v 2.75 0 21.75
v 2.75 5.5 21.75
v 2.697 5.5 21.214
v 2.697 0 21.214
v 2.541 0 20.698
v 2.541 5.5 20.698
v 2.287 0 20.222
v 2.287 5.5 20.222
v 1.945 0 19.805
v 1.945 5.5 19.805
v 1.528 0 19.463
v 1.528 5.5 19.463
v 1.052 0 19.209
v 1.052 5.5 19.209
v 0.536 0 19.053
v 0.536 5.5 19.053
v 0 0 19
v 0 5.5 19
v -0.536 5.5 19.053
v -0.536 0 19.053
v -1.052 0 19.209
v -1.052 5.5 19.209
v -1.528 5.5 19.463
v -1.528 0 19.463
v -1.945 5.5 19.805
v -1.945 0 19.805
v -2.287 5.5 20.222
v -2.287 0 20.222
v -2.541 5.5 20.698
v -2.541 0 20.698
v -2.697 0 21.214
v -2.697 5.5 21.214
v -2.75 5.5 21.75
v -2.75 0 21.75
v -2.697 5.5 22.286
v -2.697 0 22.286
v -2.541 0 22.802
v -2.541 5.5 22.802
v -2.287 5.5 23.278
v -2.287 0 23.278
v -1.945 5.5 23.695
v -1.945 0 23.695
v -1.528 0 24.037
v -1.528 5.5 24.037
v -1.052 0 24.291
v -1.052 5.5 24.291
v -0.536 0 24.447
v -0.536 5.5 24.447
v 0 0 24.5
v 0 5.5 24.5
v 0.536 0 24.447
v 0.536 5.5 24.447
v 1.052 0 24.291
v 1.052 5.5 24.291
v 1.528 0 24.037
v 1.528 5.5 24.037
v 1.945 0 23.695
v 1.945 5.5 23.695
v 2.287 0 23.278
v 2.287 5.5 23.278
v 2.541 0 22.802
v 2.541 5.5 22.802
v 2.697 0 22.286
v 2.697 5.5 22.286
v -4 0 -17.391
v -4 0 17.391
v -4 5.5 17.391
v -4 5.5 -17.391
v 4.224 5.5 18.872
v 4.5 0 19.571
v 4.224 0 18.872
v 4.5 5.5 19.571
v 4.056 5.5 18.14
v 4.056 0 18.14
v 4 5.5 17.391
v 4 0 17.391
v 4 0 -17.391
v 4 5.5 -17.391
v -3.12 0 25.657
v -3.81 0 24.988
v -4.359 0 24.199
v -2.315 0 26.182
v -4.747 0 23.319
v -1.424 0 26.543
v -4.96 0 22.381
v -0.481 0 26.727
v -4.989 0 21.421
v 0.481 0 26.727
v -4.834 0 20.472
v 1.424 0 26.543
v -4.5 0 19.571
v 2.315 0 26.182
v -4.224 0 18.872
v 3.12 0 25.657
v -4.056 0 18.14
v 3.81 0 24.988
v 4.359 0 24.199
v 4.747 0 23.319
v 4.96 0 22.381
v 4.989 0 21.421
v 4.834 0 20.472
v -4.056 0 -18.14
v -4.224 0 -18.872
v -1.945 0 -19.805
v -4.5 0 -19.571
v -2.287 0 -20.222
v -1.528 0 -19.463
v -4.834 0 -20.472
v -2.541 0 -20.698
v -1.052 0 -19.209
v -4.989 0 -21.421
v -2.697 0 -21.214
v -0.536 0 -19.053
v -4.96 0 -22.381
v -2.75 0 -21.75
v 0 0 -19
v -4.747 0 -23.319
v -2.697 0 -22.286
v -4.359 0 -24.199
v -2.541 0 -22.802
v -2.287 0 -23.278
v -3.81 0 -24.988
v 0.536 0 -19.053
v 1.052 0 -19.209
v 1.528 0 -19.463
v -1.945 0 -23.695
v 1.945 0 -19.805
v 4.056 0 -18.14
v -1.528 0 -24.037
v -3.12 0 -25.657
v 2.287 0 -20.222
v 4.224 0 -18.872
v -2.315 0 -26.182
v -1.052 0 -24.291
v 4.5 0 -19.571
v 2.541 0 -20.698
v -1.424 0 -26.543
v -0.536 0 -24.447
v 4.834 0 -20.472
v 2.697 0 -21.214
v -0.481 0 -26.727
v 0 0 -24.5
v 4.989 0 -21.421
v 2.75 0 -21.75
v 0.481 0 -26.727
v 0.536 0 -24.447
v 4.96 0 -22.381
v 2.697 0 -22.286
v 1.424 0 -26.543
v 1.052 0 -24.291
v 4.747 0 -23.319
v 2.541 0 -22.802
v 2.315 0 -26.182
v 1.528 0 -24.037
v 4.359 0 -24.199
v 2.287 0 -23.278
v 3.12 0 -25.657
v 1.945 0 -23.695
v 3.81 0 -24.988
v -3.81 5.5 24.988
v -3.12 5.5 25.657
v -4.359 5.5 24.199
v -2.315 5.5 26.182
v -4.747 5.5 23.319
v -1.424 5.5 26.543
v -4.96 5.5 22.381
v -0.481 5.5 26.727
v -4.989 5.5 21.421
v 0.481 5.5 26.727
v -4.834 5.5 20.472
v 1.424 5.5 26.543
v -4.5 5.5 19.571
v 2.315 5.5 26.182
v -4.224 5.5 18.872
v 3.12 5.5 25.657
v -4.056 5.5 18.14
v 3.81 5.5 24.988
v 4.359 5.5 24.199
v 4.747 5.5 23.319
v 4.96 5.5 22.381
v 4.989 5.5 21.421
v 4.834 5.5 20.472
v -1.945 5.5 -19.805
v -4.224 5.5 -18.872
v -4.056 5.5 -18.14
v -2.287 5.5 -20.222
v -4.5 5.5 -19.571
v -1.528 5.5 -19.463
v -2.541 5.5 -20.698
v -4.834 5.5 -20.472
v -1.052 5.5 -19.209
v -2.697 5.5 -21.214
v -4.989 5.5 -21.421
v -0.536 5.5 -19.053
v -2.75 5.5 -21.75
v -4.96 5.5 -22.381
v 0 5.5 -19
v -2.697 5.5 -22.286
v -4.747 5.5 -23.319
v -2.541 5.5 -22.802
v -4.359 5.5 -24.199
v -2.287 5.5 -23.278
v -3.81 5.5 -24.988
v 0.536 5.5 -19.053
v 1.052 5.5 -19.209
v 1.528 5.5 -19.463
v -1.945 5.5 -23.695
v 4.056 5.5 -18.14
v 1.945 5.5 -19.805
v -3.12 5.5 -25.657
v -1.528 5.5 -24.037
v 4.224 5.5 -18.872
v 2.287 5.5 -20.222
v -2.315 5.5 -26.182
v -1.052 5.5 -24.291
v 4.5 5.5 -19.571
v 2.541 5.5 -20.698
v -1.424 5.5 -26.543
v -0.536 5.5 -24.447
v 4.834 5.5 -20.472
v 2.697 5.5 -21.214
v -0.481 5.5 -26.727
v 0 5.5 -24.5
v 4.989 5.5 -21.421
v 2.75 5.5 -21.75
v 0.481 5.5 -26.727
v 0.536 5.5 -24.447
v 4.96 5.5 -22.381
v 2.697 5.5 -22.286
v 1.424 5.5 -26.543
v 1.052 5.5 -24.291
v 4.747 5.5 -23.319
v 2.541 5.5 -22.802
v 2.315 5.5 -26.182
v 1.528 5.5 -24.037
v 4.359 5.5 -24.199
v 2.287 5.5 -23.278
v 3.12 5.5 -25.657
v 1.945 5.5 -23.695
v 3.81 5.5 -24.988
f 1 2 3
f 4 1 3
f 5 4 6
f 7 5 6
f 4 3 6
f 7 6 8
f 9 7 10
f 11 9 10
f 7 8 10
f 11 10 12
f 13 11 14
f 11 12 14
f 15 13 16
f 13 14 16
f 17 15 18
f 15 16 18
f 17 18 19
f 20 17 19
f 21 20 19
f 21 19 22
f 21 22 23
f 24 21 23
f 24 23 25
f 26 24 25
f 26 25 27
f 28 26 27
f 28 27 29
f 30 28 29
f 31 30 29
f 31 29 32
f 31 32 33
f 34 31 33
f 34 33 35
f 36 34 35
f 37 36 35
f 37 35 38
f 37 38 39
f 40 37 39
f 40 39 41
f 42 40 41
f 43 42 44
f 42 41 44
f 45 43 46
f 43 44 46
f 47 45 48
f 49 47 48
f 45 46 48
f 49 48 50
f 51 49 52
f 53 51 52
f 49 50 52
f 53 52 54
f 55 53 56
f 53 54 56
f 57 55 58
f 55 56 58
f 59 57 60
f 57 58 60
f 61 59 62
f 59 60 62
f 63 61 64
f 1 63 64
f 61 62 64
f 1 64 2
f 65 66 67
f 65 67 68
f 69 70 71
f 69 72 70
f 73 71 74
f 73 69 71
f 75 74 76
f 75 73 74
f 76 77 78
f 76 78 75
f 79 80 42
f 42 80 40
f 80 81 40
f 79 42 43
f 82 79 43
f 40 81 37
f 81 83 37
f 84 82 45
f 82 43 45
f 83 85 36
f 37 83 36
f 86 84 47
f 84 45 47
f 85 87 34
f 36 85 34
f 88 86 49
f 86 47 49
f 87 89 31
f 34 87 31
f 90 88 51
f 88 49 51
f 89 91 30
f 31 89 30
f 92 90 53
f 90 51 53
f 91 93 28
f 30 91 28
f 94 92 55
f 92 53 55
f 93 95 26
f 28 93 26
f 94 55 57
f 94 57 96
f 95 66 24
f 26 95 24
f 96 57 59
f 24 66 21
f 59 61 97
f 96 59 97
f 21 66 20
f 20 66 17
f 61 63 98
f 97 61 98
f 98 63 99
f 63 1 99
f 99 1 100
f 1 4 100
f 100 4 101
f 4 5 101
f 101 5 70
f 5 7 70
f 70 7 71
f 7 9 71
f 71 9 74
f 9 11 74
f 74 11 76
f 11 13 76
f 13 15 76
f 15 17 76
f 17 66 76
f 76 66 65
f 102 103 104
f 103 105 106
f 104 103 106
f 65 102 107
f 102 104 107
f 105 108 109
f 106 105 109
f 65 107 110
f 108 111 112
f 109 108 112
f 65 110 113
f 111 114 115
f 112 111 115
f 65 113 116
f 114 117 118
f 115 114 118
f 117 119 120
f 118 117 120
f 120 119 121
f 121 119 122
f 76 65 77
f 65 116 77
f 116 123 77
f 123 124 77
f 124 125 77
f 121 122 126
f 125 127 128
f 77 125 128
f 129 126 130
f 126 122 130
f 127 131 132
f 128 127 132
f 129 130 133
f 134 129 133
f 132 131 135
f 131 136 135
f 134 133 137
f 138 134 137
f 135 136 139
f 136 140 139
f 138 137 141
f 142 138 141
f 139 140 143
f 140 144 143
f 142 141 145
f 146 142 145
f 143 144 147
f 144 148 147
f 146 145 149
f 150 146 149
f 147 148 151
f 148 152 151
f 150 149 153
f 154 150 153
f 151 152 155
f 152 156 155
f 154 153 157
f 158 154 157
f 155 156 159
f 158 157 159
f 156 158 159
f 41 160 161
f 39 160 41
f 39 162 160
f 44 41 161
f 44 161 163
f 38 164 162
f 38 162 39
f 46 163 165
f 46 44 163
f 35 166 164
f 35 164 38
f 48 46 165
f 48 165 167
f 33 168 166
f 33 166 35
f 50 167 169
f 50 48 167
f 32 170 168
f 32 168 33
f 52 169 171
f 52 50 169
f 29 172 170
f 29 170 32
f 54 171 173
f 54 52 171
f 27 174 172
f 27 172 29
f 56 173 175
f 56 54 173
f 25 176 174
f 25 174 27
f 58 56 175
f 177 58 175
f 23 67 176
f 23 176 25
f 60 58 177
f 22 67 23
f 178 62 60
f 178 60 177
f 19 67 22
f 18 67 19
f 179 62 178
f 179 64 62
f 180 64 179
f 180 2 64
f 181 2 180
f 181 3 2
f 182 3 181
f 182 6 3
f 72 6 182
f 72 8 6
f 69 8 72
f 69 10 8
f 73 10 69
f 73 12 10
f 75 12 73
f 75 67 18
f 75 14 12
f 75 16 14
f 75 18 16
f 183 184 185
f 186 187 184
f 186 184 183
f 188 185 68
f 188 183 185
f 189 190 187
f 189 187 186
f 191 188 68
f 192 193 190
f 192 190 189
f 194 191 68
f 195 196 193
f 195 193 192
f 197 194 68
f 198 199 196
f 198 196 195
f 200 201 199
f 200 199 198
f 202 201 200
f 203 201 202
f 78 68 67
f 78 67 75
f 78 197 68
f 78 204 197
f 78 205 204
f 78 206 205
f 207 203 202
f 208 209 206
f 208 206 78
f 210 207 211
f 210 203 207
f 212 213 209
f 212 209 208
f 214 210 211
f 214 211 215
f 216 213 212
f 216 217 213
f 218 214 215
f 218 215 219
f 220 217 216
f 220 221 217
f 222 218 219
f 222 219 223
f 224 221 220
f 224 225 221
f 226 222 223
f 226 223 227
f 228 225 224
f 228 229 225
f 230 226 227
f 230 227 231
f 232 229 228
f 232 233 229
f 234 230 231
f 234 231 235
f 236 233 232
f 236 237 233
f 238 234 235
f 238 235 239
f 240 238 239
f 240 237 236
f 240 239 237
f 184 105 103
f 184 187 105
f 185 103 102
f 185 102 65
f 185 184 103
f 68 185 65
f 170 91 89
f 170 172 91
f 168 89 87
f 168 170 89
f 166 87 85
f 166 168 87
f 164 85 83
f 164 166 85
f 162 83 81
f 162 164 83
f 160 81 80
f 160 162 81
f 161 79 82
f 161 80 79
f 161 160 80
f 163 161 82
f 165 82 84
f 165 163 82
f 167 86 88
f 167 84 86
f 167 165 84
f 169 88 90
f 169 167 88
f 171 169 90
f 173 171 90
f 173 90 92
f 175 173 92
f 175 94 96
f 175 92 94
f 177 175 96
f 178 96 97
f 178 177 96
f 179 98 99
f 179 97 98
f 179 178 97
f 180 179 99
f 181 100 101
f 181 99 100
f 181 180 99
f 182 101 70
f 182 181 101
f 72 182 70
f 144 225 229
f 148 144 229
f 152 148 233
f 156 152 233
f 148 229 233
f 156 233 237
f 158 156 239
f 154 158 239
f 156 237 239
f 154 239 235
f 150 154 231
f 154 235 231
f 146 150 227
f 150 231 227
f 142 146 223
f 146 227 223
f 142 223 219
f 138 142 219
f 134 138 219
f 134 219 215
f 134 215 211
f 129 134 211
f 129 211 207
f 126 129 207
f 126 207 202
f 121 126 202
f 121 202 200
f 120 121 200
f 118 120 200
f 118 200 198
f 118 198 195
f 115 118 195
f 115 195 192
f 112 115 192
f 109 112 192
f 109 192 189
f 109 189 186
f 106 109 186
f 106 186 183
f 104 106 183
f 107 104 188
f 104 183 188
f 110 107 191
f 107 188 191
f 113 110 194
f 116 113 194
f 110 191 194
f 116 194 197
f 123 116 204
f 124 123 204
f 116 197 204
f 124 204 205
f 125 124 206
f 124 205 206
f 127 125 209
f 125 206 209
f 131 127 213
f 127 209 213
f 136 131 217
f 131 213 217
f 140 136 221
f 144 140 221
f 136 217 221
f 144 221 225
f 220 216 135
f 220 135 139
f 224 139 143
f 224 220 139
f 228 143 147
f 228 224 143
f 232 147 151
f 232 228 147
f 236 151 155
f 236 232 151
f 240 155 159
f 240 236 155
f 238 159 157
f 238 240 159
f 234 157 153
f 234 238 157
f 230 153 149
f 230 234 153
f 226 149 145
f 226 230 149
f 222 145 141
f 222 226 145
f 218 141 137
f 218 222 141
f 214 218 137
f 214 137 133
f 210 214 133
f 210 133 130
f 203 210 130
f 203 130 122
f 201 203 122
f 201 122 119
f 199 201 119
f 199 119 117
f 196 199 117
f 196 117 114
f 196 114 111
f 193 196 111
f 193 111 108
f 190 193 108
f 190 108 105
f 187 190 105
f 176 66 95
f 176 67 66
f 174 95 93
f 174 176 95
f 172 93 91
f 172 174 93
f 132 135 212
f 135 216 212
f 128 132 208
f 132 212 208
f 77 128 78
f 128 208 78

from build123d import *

# Parameters (mm, degrees)
BOSS_EXTRUDE1_DEPTH = 5.5
SKETCH2_R           = 2.75
CUT_EXTRUDE2_DEPTH  = 6.5
SKETCH3_R           = 5
SKETCH3_R_2         = 2.75
BOSS_EXTRUDE2_DEPTH = 5.5
FILLET1_R           = 5


with BuildPart() as part:
    # Sketch1 → Boss-Extrude1 (new body)
    with BuildSketch(Plane(origin=(0, 0, 0), x_dir=(1, 0, 0), z_dir=(0, 1, 0))):
        with BuildLine():
            Line((-4, -21.75), (-4, 21.75))
            ThreePointArc((-4, 21.75), (0, 25.75), (4, 21.75))
            Line((4, 21.75), (4, -21.75))
            ThreePointArc((4, -21.75), (0, -25.75), (-4, -21.75))
        make_face()
    extrude(amount=BOSS_EXTRUDE1_DEPTH)

    # Sketch2 → Cut-Extrude2 (cut, through all)
    with BuildSketch(Plane(origin=(0, 5.5, 0), x_dir=(1, 0, 0), z_dir=(0, 1, 0))):
        with Locations((0, 21.75)):
            Circle(SKETCH2_R)
        with Locations((0, -21.75)):
            Circle(SKETCH2_R)
    extrude(amount=-CUT_EXTRUDE2_DEPTH, mode=Mode.SUBTRACT)

    # Sketch3 → Boss-Extrude2 (add)
    with BuildSketch(Plane(origin=(0, 5.5, 0), x_dir=(1, 0, 0), z_dir=(0, 1, 0))):
        with Locations((0, 21.75)):
            Circle(SKETCH3_R)
        with Locations((0, 21.75)):
            Circle(SKETCH3_R_2, mode=Mode.SUBTRACT)
        with Locations((0, -21.75)):
            Circle(SKETCH3_R)
        with Locations((0, -21.75)):
            Circle(SKETCH3_R_2, mode=Mode.SUBTRACT)
    extrude(amount=-BOSS_EXTRUDE2_DEPTH)

    # Fillet1
    fillet1_edges = [part.edges().sort_by_distance(p)[0] for p in [
        (-4, 2.75, -18.75),
        (4, 2.75, -18.75),
        (-4, 2.75, 18.75),
        (4, 2.75, 18.75),
    ]]
    fillet(fillet1_edges, radius=FILLET1_R)


solid = part.part
